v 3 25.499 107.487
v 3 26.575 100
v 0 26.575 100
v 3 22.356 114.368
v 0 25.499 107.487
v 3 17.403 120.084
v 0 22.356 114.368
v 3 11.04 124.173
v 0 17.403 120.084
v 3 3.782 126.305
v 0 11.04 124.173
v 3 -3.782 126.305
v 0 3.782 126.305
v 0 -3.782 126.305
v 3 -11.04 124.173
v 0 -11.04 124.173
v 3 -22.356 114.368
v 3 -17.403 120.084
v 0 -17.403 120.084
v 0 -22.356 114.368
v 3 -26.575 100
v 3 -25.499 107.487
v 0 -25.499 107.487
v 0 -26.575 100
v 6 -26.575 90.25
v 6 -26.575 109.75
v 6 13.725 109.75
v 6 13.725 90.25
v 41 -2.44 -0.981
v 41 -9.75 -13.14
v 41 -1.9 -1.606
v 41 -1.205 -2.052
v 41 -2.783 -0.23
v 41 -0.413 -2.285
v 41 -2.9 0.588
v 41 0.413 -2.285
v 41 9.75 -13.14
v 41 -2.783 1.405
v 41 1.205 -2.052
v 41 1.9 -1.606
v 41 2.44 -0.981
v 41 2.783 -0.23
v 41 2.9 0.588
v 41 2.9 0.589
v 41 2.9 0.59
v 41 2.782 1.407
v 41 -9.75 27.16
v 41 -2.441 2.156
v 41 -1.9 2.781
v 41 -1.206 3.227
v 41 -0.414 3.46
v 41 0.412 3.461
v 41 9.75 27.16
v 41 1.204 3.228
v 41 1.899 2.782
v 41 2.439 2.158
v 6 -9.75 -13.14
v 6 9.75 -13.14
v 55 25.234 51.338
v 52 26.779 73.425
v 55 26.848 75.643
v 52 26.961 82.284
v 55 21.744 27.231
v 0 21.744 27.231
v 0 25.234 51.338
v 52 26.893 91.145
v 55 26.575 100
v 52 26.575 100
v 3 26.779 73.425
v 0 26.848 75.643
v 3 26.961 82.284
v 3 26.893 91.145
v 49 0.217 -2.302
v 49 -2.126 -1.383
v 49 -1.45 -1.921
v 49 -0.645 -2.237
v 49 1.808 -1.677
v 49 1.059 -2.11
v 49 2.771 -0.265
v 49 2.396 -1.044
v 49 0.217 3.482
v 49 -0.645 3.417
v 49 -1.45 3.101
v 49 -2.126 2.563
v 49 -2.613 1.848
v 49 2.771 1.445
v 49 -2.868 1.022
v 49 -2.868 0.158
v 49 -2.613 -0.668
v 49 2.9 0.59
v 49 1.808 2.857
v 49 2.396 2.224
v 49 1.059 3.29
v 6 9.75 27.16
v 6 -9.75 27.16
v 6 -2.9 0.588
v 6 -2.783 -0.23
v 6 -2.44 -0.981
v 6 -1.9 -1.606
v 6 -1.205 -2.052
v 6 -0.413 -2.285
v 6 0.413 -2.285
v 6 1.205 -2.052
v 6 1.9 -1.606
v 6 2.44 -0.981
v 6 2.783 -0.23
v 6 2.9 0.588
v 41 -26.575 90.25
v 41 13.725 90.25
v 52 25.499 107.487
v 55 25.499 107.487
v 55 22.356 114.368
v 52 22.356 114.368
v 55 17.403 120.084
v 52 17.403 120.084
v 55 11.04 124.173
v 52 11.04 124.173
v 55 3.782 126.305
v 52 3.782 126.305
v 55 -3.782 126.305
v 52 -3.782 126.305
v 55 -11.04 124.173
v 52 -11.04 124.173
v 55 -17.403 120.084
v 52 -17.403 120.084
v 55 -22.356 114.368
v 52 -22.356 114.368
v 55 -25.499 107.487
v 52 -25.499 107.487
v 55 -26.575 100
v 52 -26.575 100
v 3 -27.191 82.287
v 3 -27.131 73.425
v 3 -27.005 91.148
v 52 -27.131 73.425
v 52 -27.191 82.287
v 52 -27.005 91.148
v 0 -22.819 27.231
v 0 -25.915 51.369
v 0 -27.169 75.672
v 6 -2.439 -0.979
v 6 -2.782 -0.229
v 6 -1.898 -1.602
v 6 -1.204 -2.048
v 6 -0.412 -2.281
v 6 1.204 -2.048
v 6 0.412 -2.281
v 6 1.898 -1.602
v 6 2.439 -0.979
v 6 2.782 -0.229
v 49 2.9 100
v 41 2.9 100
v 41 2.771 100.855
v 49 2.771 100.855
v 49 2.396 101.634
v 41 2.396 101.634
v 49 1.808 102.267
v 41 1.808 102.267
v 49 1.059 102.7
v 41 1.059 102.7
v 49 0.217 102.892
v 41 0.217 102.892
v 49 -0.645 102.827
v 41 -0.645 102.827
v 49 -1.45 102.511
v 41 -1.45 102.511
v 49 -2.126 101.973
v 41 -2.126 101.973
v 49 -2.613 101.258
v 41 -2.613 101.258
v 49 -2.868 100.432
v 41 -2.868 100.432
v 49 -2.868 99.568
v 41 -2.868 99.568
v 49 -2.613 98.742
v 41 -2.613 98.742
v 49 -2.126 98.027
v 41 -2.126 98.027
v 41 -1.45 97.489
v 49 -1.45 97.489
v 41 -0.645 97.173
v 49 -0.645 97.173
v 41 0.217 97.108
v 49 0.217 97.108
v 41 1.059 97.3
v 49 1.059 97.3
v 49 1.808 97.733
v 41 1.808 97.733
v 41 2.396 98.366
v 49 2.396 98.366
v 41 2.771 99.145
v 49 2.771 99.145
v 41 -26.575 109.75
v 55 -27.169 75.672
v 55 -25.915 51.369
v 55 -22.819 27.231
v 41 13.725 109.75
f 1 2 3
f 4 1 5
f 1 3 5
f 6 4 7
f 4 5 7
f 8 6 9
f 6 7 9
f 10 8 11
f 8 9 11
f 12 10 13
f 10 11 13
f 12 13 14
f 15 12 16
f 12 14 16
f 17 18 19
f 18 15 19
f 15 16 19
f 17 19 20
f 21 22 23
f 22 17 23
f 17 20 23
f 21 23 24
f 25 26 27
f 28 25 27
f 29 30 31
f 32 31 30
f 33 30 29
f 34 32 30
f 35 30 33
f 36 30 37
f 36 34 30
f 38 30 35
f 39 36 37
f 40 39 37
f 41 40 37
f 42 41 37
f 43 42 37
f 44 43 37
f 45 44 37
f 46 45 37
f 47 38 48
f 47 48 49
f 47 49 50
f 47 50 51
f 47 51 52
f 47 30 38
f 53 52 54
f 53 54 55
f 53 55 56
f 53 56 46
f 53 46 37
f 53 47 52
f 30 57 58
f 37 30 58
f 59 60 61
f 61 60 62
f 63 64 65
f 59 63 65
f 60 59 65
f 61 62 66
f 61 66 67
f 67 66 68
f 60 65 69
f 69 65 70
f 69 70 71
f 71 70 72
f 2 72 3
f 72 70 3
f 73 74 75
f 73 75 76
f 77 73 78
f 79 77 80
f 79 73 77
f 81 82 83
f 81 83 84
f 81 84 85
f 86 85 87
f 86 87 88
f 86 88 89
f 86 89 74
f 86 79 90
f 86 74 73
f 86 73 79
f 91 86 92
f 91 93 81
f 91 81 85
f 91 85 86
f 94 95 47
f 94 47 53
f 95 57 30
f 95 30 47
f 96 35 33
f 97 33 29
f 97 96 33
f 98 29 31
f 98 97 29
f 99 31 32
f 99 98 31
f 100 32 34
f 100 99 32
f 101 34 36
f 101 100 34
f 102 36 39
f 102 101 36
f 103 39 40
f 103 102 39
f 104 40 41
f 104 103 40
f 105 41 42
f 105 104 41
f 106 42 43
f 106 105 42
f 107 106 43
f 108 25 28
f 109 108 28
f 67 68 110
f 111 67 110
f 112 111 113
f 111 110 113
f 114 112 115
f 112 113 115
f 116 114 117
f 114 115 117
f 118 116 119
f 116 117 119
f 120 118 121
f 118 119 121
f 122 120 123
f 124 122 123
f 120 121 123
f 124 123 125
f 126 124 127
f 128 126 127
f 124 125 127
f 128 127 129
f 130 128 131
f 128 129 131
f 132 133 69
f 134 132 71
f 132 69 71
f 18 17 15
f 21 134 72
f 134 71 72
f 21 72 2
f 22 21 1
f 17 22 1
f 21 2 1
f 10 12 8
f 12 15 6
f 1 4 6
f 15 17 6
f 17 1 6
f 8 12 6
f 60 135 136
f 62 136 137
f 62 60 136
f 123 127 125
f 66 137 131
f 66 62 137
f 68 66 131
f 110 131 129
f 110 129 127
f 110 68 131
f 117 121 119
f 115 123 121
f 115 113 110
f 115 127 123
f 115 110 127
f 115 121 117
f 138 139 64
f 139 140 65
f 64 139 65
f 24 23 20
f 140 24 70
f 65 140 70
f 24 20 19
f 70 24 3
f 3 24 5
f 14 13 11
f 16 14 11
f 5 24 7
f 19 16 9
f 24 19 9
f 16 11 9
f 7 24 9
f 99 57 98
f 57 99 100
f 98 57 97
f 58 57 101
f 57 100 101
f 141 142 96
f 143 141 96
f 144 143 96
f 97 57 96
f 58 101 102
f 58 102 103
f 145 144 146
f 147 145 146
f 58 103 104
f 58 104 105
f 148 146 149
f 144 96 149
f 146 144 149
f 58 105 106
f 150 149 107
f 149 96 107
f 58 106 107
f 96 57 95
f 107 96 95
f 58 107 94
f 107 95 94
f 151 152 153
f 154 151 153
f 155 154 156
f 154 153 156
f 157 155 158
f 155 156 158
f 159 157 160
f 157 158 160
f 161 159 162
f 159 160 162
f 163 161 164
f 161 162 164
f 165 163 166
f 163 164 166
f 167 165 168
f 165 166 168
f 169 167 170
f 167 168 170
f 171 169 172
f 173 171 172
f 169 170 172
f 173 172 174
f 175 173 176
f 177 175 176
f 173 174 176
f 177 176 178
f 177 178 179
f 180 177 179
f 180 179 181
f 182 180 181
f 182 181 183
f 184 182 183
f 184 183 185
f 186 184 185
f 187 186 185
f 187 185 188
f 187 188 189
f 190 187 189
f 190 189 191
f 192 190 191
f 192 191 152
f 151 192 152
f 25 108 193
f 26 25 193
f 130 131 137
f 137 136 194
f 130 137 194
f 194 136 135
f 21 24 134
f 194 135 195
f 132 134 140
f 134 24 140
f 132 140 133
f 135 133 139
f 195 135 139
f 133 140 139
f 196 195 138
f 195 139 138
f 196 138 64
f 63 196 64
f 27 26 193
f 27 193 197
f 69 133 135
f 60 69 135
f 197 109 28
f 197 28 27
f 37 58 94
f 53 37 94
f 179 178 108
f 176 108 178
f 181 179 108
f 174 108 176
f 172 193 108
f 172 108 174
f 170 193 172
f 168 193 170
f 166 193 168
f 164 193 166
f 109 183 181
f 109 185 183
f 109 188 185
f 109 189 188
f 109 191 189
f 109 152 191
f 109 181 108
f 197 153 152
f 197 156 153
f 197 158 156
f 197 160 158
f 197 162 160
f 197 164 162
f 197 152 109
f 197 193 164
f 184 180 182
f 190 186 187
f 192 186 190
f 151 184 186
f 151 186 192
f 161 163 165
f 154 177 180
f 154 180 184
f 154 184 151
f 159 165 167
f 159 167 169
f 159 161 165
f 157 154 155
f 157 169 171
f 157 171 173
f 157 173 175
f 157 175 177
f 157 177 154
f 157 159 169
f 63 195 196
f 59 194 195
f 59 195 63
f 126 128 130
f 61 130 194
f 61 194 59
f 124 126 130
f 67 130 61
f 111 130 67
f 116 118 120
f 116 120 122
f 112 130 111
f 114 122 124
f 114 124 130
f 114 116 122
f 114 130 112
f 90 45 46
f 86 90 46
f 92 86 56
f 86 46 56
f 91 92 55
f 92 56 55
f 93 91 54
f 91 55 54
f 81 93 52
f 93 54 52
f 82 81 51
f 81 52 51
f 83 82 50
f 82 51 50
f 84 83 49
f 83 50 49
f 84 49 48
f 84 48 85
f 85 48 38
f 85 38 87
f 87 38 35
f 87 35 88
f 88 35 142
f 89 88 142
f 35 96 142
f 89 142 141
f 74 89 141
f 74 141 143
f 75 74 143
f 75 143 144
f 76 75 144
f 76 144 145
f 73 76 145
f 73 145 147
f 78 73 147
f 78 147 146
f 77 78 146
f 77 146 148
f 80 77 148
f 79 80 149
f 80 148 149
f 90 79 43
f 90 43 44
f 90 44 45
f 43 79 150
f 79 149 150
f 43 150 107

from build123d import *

# Parameters (mm, degrees)
PAD_DEPTH    = 55
SKETCH003_W  = 49
SKETCH003_H  = 53.15
POCKET_DEPTH = 100
SKETCH005_W  = 40.3
SKETCH005_H  = 19.5
SKETCH005_R  = 2.9
PAD001_DEPTH = 35
SKETCH006_R  = 2.9
PAD002_DEPTH = 43
SKETCH007_W  = 19.5
SKETCH007_H  = 40.3
SKETCH007_R  = 2.9
PAD003_DEPTH = 35
SKETCH008_R  = 2.9
PAD004_DEPTH = 43


with BuildPart() as upperlegbody:
    # Sketch → Pad (new body)
    with BuildSketch(Plane.YZ):
        with BuildLine():
            ThreePointArc((26.575, 99.999999), (0, 126.574999), (-26.575, 99.999998))
            ThreePointArc((-26.575, 99.999998), (-26.773139, 63.508395), (-22.818951, 27.231119))
            Line((-22.818951, 27.231119), (21.743508, 27.231119))
            ThreePointArc((21.743508, 27.231119), (26.276787, 63.474965), (26.575, 99.999999))
        make_face()
    extrude(amount=PAD_DEPTH)

    # Sketch003 → Pocket (cut)
    with BuildSketch(Plane(origin=(3, 50, 0), x_dir=(1, 0, 0), z_dir=(0, -1, 0))):
        with Locations((24.5, 100)):
            Rectangle(SKETCH003_W, SKETCH003_H)
    extrude(amount=POCKET_DEPTH, mode=Mode.SUBTRACT)


with BuildPart() as femurservobody:
    # Sketch005 → Pad001 (new body)
    with BuildSketch(Plane.YZ):
        with Locations((-6.425, 100)):
            Rectangle(SKETCH005_W, SKETCH005_H)
        with Locations((0, 100)):
            Circle(SKETCH005_R, mode=Mode.SUBTRACT)
    extrude(amount=PAD001_DEPTH)

    # Sketch006 → Pad002 (join)
    with BuildSketch(Plane.YZ):
        with Locations((0, 100)):
            Circle(SKETCH006_R)
    extrude(amount=PAD002_DEPTH)


with BuildPart() as femurservobody_1:
    # Body001 placement: moved
    add(femurservobody.part.moved(Location((6, 0, 0))))


with BuildPart() as kneeservobody:
    # Sketch007 → Pad003 (new body)
    with BuildSketch(Plane.YZ):
        with Locations((0, 7.010211)):
            Rectangle(SKETCH007_W, SKETCH007_H)
        with Locations((0, 0.585211)):
            Circle(SKETCH007_R, mode=Mode.SUBTRACT)
    extrude(amount=PAD003_DEPTH)

    # Sketch008 → Pad004 (join)
    with BuildSketch(Plane.YZ):
        with Locations((0, 0.59)):
            Circle(SKETCH008_R)
    extrude(amount=PAD004_DEPTH)


with BuildPart() as kneeservobody_1:
    # Body002 placement: moved
    add(kneeservobody.part.moved(Location((6, 0, 0))))


solid = Compound([upperlegbody.part, femurservobody_1.part, kneeservobody_1.part])
